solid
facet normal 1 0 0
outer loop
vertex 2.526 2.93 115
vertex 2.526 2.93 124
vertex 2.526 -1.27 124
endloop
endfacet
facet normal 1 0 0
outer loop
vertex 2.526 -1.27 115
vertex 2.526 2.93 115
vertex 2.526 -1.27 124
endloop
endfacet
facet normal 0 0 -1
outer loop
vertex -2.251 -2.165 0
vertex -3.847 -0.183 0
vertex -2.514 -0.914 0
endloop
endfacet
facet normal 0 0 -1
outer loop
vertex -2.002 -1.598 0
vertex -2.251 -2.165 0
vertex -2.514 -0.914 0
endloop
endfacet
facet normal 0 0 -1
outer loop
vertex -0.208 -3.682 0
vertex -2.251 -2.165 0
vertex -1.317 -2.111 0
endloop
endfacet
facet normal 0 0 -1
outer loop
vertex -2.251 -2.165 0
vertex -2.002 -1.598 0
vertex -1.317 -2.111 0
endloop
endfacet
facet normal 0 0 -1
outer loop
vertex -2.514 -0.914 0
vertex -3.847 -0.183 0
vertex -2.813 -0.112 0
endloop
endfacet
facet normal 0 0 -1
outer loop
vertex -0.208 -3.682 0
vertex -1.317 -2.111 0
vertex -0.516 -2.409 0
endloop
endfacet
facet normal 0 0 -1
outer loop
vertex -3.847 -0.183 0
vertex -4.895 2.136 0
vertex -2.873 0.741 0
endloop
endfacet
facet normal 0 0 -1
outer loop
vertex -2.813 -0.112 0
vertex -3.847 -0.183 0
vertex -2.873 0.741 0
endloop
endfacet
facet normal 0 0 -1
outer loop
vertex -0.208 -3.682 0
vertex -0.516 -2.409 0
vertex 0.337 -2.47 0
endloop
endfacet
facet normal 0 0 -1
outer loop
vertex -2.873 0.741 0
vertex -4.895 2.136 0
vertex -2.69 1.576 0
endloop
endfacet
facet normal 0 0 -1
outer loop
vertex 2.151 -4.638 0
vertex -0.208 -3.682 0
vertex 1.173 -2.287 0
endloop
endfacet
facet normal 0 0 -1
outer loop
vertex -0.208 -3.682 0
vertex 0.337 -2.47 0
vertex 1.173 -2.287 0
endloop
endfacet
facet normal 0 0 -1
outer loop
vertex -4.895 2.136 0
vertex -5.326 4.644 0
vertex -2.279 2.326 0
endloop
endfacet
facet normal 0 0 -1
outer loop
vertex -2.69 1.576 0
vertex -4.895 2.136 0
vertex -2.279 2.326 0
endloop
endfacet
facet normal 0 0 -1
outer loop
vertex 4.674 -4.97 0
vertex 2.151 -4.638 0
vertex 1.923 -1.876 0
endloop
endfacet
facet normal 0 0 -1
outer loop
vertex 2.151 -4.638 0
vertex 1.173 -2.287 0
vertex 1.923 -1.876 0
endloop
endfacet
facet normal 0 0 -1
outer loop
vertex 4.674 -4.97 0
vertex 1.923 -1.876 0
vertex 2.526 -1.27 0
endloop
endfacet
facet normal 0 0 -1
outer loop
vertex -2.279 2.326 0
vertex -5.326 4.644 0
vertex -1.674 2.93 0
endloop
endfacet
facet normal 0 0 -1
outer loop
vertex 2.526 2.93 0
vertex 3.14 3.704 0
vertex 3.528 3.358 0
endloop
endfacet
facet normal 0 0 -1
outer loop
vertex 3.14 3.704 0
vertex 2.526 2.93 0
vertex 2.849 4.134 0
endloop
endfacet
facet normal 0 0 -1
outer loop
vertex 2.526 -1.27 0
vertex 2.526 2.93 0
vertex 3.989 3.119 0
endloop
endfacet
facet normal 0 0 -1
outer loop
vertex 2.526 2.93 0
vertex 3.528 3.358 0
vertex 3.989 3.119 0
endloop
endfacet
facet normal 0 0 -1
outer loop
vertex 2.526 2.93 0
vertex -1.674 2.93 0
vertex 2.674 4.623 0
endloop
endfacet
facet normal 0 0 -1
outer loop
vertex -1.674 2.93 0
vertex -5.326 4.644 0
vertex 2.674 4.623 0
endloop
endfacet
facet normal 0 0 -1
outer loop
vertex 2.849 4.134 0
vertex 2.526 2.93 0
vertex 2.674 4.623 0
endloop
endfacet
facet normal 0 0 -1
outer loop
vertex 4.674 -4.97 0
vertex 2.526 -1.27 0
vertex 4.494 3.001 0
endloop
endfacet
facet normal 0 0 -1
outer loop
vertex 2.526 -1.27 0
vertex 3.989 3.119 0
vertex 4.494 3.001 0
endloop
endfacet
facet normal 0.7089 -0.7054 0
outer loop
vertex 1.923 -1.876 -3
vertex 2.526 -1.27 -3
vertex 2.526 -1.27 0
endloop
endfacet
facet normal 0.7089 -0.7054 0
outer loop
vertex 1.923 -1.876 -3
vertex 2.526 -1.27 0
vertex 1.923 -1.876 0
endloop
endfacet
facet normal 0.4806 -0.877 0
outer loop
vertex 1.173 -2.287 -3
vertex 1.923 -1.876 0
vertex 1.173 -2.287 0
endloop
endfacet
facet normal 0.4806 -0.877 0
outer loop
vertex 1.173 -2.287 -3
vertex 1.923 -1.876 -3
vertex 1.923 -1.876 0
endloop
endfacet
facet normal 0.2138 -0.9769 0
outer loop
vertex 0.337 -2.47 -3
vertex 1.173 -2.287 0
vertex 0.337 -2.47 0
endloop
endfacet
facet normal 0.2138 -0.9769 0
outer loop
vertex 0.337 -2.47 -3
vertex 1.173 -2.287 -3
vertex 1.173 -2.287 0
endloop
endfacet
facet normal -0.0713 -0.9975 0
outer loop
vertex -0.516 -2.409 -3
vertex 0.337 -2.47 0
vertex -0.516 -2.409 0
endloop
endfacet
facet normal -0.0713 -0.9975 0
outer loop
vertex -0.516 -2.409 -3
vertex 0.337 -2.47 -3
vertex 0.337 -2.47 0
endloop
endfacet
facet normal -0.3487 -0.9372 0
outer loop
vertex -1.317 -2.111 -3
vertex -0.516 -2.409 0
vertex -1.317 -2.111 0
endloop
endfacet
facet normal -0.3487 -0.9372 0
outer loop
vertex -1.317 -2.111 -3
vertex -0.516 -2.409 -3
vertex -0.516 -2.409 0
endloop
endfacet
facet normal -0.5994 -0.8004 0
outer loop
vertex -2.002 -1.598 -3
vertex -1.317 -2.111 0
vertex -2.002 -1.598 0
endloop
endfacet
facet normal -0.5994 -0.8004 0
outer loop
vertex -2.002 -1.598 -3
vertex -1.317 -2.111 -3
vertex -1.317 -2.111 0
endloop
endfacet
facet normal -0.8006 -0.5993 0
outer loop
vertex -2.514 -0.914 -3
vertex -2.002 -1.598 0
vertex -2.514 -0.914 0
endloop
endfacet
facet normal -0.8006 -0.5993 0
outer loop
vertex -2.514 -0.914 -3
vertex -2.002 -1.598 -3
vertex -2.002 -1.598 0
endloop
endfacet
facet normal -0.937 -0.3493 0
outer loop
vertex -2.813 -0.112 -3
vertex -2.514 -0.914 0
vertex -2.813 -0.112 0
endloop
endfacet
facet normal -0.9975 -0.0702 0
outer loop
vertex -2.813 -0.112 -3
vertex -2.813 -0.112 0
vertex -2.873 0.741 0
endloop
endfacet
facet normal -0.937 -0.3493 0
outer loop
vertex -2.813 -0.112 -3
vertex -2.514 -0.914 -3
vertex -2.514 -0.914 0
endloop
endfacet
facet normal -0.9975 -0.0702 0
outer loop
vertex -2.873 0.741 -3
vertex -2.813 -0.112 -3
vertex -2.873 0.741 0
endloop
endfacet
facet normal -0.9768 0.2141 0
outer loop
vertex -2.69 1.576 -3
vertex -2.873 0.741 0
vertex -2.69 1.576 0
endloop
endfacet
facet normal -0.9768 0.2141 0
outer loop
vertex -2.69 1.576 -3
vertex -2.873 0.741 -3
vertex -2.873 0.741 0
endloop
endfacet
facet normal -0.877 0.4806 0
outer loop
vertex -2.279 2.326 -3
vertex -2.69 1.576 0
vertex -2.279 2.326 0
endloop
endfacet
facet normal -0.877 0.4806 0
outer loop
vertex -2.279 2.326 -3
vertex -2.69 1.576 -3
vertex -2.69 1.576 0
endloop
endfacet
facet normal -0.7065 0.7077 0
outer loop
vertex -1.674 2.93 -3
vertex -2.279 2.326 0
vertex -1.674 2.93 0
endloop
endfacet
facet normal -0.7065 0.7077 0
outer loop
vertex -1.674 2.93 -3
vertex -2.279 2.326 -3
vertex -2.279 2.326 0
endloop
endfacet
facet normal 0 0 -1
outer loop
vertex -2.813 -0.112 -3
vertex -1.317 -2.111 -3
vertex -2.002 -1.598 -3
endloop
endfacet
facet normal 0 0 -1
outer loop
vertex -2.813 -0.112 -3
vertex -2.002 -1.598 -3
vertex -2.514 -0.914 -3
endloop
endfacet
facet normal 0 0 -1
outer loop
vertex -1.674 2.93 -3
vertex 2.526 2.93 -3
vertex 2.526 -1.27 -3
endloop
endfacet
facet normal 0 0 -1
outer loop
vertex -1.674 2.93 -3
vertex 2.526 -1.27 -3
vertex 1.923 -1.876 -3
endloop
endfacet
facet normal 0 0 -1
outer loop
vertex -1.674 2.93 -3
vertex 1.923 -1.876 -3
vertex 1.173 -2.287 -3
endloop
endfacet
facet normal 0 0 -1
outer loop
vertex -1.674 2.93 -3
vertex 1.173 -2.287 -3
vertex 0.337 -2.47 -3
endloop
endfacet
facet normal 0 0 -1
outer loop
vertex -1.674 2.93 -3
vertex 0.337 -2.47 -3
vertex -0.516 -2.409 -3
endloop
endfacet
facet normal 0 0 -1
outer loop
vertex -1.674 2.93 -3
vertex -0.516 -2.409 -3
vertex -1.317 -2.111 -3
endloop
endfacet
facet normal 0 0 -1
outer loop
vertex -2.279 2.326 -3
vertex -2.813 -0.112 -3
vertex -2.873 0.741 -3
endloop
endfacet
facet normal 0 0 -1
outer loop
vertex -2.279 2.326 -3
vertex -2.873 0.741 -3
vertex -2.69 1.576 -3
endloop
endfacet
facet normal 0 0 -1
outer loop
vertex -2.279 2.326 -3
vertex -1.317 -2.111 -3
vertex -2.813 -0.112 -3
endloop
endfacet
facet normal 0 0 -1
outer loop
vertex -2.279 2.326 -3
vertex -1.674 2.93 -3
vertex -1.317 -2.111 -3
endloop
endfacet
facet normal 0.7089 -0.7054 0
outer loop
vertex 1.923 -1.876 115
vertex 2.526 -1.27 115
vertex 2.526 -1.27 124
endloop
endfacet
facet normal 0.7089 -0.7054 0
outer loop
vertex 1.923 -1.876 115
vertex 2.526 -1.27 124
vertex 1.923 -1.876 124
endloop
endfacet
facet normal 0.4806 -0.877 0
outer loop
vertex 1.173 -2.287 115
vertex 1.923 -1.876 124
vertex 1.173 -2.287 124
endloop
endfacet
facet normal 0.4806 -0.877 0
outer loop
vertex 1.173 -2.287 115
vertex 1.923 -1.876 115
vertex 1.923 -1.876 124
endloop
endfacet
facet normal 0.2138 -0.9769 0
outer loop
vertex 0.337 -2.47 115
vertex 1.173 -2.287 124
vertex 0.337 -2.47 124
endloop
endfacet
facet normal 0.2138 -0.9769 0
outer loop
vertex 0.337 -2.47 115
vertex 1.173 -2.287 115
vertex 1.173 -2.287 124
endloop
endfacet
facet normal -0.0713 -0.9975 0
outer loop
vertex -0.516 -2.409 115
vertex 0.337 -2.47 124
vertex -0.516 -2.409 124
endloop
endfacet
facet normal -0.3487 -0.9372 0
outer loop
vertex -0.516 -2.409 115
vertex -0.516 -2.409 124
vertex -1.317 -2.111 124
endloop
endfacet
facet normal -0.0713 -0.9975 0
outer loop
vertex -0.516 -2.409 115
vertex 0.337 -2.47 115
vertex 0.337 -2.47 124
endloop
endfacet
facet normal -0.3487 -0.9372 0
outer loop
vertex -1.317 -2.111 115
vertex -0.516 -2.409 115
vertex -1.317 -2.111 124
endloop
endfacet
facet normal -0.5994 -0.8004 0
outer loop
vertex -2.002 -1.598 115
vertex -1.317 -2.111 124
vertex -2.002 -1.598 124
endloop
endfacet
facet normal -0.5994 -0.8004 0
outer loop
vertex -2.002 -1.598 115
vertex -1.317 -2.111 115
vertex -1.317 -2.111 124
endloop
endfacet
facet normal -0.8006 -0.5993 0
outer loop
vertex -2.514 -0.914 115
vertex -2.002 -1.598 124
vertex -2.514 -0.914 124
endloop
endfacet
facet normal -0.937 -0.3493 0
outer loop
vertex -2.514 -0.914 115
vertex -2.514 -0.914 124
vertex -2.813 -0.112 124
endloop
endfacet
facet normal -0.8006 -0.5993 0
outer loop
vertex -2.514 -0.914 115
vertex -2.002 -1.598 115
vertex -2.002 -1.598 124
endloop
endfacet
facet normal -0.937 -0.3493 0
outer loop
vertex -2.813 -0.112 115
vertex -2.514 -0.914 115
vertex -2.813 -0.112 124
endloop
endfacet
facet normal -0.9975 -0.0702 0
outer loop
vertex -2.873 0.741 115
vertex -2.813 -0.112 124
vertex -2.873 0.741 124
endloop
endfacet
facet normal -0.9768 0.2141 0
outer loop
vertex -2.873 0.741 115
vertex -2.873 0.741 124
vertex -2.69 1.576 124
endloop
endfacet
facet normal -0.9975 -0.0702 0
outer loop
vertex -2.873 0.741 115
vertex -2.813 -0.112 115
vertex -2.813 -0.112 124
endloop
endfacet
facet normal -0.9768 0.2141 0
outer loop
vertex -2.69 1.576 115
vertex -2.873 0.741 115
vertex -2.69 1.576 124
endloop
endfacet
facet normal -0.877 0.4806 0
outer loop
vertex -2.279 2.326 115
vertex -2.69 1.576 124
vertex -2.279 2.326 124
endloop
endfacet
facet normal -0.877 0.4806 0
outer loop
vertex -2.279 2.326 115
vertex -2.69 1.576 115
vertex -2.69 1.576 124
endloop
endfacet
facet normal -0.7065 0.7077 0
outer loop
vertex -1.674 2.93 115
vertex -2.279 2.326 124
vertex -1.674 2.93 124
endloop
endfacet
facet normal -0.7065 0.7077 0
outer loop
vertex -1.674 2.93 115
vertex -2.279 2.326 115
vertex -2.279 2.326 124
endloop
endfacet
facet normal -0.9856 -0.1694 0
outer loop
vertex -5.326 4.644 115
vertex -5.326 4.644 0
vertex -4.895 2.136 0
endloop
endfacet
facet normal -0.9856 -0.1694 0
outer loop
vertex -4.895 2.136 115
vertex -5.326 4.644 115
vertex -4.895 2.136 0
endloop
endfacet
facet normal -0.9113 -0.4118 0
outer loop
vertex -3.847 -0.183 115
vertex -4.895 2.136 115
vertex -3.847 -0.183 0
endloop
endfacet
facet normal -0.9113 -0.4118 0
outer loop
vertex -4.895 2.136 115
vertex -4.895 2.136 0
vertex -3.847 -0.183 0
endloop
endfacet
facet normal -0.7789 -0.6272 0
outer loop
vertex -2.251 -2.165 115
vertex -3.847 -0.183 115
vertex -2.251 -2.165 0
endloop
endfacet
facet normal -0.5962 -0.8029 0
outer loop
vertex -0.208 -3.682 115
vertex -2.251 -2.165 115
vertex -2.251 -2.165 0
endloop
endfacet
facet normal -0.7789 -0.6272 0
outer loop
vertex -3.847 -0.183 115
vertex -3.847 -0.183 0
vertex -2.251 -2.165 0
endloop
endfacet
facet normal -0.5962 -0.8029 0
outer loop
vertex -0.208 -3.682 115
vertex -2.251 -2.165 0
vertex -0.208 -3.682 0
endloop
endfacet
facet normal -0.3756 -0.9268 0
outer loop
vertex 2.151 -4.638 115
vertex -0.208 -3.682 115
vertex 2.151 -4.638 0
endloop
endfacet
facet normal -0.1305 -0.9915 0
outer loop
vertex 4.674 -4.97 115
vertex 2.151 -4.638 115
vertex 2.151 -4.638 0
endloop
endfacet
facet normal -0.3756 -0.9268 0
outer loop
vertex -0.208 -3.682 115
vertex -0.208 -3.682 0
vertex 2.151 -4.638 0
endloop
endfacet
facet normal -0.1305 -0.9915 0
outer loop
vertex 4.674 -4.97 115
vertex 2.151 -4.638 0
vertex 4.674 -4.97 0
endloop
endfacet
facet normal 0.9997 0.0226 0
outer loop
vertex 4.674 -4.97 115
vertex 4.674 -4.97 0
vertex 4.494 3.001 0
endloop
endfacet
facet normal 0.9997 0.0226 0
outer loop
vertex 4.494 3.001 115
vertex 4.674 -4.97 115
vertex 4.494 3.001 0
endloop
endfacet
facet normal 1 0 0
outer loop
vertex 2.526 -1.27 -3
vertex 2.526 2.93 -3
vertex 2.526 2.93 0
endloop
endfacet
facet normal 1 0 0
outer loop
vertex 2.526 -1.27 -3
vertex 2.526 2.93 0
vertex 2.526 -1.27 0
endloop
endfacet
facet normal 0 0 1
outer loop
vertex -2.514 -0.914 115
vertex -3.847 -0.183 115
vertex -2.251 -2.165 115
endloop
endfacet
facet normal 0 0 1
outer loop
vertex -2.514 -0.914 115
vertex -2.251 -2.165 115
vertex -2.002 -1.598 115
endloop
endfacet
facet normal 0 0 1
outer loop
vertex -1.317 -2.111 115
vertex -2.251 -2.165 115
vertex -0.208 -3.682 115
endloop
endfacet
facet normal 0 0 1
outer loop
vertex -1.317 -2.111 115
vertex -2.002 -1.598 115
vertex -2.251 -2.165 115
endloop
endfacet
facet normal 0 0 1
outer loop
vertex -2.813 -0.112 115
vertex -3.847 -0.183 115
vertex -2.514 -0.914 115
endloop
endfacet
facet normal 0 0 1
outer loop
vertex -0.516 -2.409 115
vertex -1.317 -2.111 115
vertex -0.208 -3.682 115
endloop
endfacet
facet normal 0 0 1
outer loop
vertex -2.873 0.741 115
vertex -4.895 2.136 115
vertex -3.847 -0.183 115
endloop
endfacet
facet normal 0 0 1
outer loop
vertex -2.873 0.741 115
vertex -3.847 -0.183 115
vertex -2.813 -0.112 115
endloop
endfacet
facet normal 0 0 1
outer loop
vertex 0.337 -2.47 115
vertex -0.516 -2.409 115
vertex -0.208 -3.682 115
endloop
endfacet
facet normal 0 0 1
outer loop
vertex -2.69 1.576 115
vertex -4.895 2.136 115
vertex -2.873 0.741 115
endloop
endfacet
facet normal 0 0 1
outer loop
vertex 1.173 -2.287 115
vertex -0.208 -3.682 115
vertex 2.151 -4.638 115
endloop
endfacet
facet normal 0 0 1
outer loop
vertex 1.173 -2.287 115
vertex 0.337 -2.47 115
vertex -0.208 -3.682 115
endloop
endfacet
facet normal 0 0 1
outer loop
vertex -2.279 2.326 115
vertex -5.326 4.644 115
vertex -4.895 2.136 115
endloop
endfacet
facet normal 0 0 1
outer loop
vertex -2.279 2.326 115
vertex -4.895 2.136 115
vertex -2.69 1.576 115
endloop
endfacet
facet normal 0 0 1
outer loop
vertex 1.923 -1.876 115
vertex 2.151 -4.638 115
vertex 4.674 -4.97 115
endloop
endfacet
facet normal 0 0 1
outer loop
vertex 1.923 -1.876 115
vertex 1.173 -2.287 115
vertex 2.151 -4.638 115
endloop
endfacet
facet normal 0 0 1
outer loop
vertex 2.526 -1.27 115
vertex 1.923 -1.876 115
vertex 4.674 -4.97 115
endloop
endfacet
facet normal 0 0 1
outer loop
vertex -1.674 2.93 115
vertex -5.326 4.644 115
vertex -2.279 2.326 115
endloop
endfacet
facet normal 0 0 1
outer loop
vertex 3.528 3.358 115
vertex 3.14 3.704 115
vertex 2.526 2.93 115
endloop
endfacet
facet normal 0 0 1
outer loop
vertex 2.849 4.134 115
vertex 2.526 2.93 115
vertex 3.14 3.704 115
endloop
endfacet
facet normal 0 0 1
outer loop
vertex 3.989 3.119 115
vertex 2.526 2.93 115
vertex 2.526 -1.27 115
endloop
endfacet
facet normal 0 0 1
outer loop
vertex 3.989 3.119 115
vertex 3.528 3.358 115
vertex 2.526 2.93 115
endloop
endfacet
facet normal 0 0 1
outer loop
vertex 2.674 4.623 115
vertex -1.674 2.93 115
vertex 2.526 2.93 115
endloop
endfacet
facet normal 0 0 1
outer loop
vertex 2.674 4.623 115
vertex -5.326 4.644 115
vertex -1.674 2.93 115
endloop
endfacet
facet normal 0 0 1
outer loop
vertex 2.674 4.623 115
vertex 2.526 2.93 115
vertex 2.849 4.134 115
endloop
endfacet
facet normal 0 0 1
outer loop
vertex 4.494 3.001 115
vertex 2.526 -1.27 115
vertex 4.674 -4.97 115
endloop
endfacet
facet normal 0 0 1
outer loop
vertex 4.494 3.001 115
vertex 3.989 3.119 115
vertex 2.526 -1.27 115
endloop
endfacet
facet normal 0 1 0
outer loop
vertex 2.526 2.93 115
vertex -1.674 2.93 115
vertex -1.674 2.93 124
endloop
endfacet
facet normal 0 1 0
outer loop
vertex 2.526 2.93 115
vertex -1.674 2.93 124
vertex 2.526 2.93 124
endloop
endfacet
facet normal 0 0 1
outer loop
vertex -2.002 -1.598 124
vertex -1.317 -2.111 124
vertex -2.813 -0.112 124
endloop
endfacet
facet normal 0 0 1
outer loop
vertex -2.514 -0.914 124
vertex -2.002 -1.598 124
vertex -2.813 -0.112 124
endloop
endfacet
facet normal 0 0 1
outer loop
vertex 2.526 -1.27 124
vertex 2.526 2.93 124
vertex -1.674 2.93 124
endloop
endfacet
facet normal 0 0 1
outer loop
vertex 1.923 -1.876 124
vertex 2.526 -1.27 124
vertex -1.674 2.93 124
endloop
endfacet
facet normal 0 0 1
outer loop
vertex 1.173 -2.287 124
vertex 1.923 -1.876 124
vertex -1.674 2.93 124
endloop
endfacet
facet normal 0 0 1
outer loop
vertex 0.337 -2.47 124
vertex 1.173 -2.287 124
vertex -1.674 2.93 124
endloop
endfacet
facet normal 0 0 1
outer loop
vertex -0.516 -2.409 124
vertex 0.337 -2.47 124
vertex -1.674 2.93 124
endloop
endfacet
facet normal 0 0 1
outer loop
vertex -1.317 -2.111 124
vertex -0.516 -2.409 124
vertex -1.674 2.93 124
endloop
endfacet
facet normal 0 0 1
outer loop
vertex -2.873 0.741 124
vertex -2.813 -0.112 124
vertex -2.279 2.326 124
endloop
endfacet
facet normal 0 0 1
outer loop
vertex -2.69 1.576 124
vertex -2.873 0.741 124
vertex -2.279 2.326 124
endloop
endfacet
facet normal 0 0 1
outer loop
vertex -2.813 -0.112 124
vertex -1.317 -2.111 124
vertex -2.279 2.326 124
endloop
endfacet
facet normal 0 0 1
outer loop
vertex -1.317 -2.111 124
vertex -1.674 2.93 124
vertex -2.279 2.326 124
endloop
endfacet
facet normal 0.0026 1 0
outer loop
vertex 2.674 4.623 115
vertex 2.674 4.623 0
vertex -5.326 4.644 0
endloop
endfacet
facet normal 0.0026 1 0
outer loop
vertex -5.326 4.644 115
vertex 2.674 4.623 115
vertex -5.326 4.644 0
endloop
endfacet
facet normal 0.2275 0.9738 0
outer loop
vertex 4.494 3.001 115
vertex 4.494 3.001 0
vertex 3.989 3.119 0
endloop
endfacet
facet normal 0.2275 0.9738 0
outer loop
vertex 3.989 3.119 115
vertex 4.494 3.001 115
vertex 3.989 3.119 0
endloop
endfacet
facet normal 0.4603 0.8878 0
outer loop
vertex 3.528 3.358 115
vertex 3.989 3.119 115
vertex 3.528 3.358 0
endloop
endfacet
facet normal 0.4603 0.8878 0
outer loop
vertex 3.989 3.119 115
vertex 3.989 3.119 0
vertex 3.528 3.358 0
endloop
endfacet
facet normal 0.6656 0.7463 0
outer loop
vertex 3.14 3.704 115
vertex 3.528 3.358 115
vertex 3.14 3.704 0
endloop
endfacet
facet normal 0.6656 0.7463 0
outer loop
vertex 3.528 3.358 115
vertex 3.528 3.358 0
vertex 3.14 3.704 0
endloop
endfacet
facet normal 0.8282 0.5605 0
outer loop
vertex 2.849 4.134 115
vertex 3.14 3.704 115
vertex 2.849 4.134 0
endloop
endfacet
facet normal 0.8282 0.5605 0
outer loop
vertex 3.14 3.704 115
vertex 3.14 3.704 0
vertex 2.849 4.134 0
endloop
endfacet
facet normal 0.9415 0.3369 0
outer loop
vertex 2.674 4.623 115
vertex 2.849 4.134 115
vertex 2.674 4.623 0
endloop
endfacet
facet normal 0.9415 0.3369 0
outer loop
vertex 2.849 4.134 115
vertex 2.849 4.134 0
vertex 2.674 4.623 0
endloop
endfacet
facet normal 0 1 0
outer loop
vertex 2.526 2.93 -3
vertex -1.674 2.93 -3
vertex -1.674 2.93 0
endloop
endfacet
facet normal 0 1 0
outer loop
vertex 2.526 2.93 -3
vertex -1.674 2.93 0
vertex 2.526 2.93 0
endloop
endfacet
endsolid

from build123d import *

# Parameters (mm, degrees)
BOSS_EXTRUDE1_DEPTH      = 115
BOSS_EXTRUDE2_DEPTH      = 9
BOSS_EXTRUDE2_DEPTH_BACK = 118


with BuildPart() as part:
    # Sketch1 → Boss-Extrude1 (new body)
    with BuildSketch(Plane.XY):
        with BuildLine():
            Line((4.673790886, -4.96994292), (4.494306077, 3.000557085))
            ThreePointArc((4.494306077, 3.000557085), (3.322885957, 3.518832419), (2.673764356, 4.623131094))
            Line((2.673764356, 4.623131094), (-5.326209114, 4.643733806))
            ThreePointArc((-5.326209114, 4.643733806), (-2.250970398, -2.165211908), (4.673790886, -4.96994292))
        make_face()
    extrude(amount=BOSS_EXTRUDE1_DEPTH)

    # Sketch2 → Boss-Extrude2 (add, two sides: drawn at the far end of the back side and taken through both)
    with BuildSketch(Plane.XY.offset(115).offset(-BOSS_EXTRUDE2_DEPTH_BACK)):
        with BuildLine():
            Line((-1.673644669, 2.929860911), (2.526355331, 2.929860911))
            Line((2.526355331, 2.929860911), (2.526355331, -1.270139089))
            ThreePointArc((2.526355331, -1.270139089), (-2.001840649, -1.598335069), (-1.673644669, 2.929860911))
        make_face()
    extrude(amount=BOSS_EXTRUDE2_DEPTH + BOSS_EXTRUDE2_DEPTH_BACK)


solid = part.part
